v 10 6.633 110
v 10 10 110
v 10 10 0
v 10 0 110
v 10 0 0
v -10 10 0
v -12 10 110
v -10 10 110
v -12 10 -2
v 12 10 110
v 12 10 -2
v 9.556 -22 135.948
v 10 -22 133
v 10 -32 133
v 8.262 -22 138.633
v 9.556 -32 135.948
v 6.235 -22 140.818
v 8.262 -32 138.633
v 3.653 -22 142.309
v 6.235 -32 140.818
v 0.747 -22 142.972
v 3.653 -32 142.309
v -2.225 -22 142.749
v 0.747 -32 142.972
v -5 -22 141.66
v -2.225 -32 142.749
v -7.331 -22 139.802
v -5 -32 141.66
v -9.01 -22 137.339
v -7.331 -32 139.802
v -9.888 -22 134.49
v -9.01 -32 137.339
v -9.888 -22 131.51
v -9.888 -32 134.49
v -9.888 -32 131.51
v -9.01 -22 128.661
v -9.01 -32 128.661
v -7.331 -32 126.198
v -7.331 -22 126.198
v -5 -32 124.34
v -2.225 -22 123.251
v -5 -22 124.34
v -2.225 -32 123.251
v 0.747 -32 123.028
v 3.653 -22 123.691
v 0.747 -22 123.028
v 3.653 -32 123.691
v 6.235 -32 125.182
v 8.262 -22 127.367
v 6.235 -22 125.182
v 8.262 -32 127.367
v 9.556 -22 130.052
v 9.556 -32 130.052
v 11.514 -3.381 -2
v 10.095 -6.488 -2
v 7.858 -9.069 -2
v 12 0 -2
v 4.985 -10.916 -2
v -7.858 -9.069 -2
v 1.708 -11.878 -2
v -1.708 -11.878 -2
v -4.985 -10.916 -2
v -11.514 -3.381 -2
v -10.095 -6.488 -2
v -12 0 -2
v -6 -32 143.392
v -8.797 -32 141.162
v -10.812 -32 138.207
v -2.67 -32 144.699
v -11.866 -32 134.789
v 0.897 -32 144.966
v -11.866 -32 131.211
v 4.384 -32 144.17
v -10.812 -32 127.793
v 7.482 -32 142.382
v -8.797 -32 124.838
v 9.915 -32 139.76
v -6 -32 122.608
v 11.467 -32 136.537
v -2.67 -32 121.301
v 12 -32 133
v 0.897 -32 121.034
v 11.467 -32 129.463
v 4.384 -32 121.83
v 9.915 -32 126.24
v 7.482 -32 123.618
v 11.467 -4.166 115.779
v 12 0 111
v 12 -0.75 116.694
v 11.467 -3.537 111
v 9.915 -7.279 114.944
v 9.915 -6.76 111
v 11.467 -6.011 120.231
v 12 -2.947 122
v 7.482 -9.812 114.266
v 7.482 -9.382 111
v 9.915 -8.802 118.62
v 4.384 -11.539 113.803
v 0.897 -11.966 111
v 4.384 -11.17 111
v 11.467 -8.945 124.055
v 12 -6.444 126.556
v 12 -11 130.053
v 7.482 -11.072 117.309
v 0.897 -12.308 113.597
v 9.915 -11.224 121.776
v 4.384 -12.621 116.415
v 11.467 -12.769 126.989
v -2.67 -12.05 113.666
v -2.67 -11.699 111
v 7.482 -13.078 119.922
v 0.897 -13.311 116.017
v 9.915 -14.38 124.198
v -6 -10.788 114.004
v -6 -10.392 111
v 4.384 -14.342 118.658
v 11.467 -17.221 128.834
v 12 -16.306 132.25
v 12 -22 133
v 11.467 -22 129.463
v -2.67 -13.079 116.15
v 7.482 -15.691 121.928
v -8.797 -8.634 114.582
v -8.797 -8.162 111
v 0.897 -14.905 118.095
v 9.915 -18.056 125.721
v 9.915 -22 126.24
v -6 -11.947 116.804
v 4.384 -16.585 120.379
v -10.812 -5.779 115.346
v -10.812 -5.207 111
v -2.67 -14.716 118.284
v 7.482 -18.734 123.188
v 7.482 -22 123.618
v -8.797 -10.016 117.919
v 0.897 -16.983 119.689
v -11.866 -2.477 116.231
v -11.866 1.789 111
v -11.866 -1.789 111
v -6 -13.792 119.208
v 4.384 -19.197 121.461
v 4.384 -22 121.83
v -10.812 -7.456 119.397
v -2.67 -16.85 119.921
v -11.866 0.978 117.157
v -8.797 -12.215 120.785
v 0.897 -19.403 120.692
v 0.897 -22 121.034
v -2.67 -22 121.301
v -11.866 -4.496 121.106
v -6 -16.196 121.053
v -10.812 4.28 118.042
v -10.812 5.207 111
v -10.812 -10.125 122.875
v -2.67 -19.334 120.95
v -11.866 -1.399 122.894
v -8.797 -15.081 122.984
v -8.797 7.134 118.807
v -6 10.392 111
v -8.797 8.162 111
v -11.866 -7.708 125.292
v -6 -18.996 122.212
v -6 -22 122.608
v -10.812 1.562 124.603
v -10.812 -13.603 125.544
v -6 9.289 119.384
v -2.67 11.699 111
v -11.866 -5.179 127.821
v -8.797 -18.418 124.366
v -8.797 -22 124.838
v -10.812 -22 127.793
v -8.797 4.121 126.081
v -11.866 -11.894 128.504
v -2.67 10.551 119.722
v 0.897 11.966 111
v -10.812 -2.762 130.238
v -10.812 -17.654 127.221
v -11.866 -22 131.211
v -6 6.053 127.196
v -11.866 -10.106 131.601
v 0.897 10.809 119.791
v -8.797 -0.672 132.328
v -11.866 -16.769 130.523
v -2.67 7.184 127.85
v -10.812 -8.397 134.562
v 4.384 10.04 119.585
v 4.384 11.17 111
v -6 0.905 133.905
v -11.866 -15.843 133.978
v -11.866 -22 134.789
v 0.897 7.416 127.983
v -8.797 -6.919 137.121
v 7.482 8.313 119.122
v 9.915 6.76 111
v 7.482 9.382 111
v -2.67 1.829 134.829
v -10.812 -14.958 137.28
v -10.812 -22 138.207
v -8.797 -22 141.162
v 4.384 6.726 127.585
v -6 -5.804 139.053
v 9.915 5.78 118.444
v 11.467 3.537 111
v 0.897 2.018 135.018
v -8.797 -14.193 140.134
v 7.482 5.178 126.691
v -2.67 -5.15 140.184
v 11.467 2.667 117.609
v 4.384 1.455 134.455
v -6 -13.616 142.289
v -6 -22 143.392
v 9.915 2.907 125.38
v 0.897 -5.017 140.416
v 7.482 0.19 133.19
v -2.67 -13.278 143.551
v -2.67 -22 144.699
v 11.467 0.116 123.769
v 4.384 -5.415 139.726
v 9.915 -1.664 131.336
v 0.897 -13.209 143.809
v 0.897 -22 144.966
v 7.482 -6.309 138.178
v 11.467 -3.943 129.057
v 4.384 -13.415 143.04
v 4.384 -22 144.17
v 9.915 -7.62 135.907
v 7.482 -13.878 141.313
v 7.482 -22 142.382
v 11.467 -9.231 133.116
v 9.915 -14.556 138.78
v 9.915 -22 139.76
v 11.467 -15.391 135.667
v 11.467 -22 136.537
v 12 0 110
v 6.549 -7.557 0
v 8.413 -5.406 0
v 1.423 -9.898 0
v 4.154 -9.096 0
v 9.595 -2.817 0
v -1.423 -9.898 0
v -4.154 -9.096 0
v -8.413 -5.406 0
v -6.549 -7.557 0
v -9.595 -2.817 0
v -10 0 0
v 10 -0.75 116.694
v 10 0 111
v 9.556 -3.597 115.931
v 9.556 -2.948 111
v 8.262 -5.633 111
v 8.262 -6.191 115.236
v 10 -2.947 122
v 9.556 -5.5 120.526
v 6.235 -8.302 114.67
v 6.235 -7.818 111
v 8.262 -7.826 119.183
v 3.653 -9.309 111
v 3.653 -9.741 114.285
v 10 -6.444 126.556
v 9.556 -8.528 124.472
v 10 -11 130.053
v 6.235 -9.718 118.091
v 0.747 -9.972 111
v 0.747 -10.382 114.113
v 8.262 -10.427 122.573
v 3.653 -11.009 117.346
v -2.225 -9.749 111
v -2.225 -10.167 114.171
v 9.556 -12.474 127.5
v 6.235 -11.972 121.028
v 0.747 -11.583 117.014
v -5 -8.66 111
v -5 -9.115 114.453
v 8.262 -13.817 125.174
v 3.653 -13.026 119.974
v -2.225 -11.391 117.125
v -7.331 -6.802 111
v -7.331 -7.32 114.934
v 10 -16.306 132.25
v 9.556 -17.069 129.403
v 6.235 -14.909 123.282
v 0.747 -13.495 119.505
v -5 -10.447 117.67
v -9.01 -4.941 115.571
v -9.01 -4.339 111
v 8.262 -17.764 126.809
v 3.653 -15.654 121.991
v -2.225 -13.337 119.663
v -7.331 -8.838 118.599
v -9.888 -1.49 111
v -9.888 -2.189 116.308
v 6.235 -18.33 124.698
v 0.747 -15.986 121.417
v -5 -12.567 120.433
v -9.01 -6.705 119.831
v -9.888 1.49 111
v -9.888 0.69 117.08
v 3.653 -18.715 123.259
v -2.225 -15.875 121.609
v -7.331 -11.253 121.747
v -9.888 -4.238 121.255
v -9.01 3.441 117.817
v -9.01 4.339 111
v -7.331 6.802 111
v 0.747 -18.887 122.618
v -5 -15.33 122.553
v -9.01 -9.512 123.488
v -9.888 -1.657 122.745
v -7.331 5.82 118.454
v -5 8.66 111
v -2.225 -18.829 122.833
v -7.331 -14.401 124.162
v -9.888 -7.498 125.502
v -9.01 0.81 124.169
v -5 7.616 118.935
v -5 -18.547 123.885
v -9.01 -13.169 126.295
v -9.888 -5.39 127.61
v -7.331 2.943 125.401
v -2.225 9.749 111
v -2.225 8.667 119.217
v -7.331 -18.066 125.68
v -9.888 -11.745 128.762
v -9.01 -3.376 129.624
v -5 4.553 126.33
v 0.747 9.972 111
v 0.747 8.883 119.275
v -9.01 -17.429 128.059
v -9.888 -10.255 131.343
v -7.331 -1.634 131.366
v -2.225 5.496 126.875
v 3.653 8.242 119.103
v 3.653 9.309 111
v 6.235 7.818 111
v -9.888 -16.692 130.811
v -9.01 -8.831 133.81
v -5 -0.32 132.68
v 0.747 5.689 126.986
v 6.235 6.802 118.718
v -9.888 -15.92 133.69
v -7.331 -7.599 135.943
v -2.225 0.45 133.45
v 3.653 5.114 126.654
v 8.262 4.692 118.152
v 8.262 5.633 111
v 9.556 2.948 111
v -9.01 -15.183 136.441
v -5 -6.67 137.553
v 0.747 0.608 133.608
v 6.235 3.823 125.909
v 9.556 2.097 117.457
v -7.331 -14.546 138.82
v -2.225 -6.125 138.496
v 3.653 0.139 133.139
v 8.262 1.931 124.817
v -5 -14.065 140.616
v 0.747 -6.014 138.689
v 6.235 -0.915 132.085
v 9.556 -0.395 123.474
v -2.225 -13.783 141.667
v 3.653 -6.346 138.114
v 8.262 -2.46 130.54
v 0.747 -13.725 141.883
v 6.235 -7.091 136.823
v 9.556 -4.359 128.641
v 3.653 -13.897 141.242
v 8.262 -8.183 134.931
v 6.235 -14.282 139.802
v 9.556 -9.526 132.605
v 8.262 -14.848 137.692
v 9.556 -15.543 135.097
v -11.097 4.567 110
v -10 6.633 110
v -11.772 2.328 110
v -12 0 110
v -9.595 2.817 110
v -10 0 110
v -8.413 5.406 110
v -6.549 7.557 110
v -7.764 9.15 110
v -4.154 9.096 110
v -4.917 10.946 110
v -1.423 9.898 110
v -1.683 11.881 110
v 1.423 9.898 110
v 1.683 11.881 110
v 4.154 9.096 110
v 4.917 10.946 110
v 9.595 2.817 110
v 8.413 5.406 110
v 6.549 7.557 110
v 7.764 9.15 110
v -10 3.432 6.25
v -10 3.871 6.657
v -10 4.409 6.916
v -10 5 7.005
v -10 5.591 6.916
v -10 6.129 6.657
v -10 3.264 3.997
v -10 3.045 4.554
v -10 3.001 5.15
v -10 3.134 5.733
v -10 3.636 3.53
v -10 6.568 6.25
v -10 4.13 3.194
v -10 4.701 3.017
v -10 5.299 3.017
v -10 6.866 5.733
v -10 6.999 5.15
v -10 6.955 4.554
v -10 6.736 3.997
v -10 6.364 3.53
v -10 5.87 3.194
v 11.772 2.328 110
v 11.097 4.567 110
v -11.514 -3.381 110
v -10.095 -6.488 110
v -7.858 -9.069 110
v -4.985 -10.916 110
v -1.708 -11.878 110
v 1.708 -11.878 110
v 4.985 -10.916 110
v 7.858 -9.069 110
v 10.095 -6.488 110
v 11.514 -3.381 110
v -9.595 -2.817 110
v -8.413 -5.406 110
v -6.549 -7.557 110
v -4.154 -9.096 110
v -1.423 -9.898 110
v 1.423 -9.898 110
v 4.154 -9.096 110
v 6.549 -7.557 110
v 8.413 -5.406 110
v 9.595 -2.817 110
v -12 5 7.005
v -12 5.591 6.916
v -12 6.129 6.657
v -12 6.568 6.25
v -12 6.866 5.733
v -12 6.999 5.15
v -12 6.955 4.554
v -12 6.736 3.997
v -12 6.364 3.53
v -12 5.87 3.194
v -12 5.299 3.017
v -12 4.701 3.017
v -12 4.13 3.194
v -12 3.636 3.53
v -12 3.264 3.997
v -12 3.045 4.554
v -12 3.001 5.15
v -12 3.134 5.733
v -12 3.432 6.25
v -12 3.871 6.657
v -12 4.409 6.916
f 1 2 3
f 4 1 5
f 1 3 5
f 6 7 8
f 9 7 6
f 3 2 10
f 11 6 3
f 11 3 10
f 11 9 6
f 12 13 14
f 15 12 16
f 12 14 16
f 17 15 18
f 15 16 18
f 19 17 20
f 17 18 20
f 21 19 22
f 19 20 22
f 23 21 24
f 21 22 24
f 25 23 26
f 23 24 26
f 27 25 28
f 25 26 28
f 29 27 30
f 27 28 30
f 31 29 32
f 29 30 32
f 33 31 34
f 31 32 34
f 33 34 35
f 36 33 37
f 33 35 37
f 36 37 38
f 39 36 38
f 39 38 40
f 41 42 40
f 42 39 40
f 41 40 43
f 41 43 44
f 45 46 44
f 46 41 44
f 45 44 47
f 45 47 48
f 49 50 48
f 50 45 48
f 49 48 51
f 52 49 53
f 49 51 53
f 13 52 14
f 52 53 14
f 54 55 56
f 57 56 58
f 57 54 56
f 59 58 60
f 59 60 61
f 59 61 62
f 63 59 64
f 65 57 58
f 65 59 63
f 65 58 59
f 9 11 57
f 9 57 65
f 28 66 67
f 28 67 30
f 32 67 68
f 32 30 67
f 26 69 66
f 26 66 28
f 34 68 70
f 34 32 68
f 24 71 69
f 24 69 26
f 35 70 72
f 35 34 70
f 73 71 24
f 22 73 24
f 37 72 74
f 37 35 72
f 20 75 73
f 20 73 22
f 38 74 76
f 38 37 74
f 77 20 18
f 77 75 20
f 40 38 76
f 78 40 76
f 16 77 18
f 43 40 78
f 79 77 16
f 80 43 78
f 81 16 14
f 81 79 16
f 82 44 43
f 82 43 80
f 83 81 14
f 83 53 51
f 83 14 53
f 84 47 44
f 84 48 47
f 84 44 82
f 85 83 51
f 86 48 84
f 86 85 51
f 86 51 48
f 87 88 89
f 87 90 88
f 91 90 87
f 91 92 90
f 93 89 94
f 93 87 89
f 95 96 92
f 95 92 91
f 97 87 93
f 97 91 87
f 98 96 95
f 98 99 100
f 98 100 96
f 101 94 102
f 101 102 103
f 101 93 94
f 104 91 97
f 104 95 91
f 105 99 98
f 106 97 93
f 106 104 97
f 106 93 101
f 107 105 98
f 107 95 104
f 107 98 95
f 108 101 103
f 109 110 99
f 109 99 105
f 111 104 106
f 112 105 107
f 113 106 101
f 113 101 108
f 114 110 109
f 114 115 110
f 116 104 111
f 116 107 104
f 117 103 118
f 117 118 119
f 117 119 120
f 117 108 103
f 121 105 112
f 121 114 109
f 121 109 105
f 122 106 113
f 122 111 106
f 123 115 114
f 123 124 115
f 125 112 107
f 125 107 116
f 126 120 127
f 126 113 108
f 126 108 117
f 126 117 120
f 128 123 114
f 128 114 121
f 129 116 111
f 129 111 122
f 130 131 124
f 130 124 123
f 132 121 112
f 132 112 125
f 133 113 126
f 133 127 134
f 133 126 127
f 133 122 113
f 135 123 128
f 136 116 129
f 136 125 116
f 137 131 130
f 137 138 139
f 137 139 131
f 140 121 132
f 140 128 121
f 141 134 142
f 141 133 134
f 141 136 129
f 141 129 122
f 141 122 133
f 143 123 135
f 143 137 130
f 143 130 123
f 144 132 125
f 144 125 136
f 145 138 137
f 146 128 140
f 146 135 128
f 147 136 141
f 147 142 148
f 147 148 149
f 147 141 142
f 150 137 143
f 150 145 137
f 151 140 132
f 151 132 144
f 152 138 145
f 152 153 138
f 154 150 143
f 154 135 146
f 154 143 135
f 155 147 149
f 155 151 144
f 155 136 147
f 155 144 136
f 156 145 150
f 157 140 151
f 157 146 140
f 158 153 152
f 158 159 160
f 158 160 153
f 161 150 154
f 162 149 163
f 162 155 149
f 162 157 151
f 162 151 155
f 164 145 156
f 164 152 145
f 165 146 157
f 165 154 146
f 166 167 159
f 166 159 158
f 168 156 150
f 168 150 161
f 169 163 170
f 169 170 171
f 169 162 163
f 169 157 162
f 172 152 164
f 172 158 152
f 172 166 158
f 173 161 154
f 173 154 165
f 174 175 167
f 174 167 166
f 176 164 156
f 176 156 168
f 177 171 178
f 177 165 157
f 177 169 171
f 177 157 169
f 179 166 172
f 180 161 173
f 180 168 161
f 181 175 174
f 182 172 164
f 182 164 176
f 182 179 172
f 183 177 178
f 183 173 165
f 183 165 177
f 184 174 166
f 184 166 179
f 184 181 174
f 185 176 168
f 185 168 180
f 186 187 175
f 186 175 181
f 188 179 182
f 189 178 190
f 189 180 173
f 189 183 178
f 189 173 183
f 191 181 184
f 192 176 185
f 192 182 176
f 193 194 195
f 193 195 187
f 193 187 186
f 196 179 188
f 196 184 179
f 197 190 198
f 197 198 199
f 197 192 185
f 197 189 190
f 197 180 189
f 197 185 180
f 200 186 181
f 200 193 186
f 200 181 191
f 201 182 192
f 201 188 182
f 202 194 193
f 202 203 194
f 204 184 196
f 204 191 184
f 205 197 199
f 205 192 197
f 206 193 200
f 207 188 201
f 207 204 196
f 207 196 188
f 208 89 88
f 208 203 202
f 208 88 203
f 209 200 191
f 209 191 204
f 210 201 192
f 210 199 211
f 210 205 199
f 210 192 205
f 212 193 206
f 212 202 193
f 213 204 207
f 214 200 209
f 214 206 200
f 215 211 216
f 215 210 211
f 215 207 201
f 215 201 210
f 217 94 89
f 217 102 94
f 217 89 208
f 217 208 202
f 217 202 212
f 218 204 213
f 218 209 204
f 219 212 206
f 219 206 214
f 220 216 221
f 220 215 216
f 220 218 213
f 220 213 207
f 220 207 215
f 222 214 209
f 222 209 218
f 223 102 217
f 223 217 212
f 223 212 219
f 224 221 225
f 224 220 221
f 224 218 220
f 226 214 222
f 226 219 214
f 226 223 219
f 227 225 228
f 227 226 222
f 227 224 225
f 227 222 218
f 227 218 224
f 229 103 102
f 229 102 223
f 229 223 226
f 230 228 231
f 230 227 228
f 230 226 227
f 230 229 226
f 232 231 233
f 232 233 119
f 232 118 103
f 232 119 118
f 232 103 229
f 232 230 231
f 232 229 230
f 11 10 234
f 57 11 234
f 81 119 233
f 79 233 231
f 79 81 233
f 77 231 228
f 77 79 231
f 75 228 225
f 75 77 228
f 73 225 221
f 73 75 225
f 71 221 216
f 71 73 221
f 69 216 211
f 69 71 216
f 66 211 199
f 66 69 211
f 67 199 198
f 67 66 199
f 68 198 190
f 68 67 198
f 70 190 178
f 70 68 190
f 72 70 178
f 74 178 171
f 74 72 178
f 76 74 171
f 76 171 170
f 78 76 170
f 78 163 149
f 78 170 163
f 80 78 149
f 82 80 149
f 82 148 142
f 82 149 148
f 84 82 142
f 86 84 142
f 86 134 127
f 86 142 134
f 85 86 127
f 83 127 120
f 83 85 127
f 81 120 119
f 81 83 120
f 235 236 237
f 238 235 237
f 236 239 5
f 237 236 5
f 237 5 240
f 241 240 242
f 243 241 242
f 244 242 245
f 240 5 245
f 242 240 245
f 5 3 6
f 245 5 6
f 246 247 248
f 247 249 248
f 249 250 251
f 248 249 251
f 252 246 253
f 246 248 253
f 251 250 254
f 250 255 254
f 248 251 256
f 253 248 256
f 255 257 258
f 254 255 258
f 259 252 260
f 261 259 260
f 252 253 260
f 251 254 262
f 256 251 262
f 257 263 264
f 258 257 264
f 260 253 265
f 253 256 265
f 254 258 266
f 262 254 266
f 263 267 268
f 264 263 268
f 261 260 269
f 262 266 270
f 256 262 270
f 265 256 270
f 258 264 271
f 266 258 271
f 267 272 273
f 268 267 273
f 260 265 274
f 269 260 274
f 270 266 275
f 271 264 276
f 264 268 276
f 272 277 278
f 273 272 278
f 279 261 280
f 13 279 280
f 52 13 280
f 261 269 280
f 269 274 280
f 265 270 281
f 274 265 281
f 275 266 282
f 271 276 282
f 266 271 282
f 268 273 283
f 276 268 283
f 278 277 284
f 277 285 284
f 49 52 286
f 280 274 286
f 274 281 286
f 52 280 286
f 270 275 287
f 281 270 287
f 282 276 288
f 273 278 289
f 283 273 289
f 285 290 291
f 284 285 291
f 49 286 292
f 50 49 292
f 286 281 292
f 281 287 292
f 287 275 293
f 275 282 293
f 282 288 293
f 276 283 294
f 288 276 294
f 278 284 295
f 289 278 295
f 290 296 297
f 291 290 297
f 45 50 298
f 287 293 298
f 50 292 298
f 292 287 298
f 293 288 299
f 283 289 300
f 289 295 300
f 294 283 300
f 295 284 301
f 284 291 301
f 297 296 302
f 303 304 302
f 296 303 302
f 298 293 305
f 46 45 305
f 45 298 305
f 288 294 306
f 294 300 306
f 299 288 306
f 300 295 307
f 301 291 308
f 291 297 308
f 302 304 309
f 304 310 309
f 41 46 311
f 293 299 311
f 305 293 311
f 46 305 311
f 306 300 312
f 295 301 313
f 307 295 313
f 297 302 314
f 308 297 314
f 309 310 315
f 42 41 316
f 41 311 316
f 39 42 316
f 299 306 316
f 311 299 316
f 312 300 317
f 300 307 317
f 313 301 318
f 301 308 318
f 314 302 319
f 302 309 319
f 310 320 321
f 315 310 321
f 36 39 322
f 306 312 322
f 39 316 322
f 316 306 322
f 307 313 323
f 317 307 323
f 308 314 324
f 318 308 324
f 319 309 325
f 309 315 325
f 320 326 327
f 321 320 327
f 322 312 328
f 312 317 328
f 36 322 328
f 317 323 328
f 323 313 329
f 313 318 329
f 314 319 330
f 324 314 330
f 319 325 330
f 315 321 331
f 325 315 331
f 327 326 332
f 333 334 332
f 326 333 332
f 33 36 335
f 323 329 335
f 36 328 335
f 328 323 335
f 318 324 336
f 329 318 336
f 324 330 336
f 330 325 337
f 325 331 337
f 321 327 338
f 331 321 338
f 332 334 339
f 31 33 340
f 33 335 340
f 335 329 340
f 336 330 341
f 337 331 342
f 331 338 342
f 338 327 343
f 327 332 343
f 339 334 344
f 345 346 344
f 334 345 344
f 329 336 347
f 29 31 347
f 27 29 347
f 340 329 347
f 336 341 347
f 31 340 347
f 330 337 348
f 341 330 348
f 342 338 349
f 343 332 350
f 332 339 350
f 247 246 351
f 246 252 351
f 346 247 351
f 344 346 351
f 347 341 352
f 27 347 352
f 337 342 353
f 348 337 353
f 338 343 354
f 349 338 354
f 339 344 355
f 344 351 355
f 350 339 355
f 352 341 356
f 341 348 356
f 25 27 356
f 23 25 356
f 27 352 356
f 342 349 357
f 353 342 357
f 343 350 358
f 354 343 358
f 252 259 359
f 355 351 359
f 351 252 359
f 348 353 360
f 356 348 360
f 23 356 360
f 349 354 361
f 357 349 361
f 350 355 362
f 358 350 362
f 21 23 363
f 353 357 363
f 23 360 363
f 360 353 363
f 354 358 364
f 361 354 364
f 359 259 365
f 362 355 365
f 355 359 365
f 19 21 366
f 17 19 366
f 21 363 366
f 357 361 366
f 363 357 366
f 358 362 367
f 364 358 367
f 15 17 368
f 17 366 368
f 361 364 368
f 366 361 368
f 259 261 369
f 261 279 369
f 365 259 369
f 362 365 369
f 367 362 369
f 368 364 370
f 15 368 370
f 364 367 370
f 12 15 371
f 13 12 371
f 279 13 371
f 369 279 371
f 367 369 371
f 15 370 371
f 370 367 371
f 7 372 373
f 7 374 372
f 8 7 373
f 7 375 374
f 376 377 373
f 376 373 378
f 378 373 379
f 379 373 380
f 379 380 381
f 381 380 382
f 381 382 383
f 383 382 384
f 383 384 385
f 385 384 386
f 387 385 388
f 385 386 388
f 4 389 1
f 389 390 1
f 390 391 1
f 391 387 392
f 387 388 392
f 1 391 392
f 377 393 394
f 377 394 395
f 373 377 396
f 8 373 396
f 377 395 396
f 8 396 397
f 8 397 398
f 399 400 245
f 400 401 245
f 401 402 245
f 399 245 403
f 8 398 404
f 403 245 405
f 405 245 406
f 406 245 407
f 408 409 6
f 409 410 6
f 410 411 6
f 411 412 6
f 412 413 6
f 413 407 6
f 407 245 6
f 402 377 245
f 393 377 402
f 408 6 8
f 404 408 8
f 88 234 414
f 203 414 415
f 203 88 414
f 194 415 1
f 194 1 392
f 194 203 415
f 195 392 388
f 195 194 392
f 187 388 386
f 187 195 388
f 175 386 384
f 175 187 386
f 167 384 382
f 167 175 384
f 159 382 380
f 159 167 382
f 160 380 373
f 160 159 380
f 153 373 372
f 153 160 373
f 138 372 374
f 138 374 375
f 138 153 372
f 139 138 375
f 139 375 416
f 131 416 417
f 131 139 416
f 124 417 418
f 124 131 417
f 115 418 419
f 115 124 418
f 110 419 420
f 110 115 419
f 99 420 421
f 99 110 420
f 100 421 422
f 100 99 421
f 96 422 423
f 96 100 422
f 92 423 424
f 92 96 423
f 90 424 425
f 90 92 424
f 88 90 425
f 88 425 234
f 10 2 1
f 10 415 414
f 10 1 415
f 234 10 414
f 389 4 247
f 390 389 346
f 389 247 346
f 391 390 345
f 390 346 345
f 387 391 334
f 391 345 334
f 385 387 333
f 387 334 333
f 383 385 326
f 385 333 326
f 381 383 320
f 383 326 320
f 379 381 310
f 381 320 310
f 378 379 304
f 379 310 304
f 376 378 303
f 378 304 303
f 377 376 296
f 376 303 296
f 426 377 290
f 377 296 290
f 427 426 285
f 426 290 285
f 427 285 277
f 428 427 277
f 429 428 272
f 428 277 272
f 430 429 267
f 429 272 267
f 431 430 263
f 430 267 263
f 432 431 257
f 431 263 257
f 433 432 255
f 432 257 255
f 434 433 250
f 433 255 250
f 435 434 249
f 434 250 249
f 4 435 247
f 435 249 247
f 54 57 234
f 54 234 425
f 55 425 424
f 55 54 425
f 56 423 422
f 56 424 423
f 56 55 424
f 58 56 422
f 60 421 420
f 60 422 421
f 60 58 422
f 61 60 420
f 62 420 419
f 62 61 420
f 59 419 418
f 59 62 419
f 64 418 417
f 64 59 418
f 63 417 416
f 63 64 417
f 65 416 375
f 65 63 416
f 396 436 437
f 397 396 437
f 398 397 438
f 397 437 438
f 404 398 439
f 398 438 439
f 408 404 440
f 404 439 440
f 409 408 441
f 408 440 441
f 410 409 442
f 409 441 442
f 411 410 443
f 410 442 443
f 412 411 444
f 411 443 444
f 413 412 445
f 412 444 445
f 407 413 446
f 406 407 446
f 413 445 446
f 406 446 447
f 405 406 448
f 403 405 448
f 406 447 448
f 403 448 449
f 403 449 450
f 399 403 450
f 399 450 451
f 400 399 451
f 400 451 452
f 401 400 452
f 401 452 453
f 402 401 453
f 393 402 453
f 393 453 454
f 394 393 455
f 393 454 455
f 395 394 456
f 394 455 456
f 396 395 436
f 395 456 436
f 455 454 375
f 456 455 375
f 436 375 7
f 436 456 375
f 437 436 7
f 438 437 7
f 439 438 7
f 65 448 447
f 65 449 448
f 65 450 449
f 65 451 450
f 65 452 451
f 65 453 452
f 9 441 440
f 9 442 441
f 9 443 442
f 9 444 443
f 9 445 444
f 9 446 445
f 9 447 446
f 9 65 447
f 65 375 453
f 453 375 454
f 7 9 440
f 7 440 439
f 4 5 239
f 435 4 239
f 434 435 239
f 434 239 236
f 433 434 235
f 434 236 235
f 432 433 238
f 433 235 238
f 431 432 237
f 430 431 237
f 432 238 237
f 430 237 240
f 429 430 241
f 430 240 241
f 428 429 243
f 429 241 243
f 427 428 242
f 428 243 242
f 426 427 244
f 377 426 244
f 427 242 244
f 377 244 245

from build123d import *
from build123d.topology import SkipClean

# Parameters (mm, degrees)
BOSS_EXTRUDE1_DEPTH = 110
BOSS_EXTRUDE3_START = -112
BOSS_EXTRUDE3_DEPTH = 2
SKETCH15_R          = 2.005
CUT_EXTRUDE1_DEPTH  = 2
SKETCH18_R          = 12
SKETCH18_R_2        = 10


with BuildPart() as part:
    # Sketch1 → Boss-Extrude1 (new body)
    with BuildSketch(Plane.XY):
        with BuildLine():
            Line((-10, 0), (-10, 10))
            Line((-10, 10), (-12, 10))
            Line((-12, 10), (-12, 0))
            ThreePointArc((-12, 0), (0, -12), (12, 0))
            Line((12, 0), (12, 10))
            Line((12, 10), (10, 10))
            Line((10, 10), (10, 0))
            ThreePointArc((10, 0), (0, -10), (-10, 0))
        make_face()
    extrude(amount=BOSS_EXTRUDE1_DEPTH)

    # Sketch8 → Boss-Extrude3 (add)
    with BuildSketch(Plane.XY.offset(110).offset(BOSS_EXTRUDE3_START)):
        with BuildLine():
            Line((-12, 10), (12, 10))
            Line((12, 10), (12, 0))
            ThreePointArc((12, 0), (0, -12), (-12, 0))
            Line((-12, 0), (-12, 10))
        make_face()
    extrude(amount=BOSS_EXTRUDE3_DEPTH)

    # Sketch15 → Cut-Extrude1 (cut)
    with BuildSketch(Plane.ZY.offset(12)):
        with Locations((5, 5)):
            Circle(SKETCH15_R)
    extrude(amount=-CUT_EXTRUDE1_DEPTH, mode=Mode.SUBTRACT)

    # Sweep2: sweep along a path in Sketch17
    with SkipClean():  # the faces are left unmerged after this step: merging them gives an invalid solid
        with BuildLine(Plane(origin=(0, 0, 0), x_dir=(0, 0, -1), z_dir=(1, 0, 0))) as sweep2_path:
            Line((-110, -12), (-111, -12))
            ThreePointArc((-111, -12), (-118.071067812, -14.928932188), (-121, -22))
            Line((-121, -22), (-121, -32))
        # Sketch18 → Sweep2 (sweep)
        with BuildSketch(Plane.XY.offset(110)):
            Circle(SKETCH18_R)
            Circle(SKETCH18_R_2, mode=Mode.SUBTRACT)
        sweep(path=sweep2_path.line)


solid = part.part
